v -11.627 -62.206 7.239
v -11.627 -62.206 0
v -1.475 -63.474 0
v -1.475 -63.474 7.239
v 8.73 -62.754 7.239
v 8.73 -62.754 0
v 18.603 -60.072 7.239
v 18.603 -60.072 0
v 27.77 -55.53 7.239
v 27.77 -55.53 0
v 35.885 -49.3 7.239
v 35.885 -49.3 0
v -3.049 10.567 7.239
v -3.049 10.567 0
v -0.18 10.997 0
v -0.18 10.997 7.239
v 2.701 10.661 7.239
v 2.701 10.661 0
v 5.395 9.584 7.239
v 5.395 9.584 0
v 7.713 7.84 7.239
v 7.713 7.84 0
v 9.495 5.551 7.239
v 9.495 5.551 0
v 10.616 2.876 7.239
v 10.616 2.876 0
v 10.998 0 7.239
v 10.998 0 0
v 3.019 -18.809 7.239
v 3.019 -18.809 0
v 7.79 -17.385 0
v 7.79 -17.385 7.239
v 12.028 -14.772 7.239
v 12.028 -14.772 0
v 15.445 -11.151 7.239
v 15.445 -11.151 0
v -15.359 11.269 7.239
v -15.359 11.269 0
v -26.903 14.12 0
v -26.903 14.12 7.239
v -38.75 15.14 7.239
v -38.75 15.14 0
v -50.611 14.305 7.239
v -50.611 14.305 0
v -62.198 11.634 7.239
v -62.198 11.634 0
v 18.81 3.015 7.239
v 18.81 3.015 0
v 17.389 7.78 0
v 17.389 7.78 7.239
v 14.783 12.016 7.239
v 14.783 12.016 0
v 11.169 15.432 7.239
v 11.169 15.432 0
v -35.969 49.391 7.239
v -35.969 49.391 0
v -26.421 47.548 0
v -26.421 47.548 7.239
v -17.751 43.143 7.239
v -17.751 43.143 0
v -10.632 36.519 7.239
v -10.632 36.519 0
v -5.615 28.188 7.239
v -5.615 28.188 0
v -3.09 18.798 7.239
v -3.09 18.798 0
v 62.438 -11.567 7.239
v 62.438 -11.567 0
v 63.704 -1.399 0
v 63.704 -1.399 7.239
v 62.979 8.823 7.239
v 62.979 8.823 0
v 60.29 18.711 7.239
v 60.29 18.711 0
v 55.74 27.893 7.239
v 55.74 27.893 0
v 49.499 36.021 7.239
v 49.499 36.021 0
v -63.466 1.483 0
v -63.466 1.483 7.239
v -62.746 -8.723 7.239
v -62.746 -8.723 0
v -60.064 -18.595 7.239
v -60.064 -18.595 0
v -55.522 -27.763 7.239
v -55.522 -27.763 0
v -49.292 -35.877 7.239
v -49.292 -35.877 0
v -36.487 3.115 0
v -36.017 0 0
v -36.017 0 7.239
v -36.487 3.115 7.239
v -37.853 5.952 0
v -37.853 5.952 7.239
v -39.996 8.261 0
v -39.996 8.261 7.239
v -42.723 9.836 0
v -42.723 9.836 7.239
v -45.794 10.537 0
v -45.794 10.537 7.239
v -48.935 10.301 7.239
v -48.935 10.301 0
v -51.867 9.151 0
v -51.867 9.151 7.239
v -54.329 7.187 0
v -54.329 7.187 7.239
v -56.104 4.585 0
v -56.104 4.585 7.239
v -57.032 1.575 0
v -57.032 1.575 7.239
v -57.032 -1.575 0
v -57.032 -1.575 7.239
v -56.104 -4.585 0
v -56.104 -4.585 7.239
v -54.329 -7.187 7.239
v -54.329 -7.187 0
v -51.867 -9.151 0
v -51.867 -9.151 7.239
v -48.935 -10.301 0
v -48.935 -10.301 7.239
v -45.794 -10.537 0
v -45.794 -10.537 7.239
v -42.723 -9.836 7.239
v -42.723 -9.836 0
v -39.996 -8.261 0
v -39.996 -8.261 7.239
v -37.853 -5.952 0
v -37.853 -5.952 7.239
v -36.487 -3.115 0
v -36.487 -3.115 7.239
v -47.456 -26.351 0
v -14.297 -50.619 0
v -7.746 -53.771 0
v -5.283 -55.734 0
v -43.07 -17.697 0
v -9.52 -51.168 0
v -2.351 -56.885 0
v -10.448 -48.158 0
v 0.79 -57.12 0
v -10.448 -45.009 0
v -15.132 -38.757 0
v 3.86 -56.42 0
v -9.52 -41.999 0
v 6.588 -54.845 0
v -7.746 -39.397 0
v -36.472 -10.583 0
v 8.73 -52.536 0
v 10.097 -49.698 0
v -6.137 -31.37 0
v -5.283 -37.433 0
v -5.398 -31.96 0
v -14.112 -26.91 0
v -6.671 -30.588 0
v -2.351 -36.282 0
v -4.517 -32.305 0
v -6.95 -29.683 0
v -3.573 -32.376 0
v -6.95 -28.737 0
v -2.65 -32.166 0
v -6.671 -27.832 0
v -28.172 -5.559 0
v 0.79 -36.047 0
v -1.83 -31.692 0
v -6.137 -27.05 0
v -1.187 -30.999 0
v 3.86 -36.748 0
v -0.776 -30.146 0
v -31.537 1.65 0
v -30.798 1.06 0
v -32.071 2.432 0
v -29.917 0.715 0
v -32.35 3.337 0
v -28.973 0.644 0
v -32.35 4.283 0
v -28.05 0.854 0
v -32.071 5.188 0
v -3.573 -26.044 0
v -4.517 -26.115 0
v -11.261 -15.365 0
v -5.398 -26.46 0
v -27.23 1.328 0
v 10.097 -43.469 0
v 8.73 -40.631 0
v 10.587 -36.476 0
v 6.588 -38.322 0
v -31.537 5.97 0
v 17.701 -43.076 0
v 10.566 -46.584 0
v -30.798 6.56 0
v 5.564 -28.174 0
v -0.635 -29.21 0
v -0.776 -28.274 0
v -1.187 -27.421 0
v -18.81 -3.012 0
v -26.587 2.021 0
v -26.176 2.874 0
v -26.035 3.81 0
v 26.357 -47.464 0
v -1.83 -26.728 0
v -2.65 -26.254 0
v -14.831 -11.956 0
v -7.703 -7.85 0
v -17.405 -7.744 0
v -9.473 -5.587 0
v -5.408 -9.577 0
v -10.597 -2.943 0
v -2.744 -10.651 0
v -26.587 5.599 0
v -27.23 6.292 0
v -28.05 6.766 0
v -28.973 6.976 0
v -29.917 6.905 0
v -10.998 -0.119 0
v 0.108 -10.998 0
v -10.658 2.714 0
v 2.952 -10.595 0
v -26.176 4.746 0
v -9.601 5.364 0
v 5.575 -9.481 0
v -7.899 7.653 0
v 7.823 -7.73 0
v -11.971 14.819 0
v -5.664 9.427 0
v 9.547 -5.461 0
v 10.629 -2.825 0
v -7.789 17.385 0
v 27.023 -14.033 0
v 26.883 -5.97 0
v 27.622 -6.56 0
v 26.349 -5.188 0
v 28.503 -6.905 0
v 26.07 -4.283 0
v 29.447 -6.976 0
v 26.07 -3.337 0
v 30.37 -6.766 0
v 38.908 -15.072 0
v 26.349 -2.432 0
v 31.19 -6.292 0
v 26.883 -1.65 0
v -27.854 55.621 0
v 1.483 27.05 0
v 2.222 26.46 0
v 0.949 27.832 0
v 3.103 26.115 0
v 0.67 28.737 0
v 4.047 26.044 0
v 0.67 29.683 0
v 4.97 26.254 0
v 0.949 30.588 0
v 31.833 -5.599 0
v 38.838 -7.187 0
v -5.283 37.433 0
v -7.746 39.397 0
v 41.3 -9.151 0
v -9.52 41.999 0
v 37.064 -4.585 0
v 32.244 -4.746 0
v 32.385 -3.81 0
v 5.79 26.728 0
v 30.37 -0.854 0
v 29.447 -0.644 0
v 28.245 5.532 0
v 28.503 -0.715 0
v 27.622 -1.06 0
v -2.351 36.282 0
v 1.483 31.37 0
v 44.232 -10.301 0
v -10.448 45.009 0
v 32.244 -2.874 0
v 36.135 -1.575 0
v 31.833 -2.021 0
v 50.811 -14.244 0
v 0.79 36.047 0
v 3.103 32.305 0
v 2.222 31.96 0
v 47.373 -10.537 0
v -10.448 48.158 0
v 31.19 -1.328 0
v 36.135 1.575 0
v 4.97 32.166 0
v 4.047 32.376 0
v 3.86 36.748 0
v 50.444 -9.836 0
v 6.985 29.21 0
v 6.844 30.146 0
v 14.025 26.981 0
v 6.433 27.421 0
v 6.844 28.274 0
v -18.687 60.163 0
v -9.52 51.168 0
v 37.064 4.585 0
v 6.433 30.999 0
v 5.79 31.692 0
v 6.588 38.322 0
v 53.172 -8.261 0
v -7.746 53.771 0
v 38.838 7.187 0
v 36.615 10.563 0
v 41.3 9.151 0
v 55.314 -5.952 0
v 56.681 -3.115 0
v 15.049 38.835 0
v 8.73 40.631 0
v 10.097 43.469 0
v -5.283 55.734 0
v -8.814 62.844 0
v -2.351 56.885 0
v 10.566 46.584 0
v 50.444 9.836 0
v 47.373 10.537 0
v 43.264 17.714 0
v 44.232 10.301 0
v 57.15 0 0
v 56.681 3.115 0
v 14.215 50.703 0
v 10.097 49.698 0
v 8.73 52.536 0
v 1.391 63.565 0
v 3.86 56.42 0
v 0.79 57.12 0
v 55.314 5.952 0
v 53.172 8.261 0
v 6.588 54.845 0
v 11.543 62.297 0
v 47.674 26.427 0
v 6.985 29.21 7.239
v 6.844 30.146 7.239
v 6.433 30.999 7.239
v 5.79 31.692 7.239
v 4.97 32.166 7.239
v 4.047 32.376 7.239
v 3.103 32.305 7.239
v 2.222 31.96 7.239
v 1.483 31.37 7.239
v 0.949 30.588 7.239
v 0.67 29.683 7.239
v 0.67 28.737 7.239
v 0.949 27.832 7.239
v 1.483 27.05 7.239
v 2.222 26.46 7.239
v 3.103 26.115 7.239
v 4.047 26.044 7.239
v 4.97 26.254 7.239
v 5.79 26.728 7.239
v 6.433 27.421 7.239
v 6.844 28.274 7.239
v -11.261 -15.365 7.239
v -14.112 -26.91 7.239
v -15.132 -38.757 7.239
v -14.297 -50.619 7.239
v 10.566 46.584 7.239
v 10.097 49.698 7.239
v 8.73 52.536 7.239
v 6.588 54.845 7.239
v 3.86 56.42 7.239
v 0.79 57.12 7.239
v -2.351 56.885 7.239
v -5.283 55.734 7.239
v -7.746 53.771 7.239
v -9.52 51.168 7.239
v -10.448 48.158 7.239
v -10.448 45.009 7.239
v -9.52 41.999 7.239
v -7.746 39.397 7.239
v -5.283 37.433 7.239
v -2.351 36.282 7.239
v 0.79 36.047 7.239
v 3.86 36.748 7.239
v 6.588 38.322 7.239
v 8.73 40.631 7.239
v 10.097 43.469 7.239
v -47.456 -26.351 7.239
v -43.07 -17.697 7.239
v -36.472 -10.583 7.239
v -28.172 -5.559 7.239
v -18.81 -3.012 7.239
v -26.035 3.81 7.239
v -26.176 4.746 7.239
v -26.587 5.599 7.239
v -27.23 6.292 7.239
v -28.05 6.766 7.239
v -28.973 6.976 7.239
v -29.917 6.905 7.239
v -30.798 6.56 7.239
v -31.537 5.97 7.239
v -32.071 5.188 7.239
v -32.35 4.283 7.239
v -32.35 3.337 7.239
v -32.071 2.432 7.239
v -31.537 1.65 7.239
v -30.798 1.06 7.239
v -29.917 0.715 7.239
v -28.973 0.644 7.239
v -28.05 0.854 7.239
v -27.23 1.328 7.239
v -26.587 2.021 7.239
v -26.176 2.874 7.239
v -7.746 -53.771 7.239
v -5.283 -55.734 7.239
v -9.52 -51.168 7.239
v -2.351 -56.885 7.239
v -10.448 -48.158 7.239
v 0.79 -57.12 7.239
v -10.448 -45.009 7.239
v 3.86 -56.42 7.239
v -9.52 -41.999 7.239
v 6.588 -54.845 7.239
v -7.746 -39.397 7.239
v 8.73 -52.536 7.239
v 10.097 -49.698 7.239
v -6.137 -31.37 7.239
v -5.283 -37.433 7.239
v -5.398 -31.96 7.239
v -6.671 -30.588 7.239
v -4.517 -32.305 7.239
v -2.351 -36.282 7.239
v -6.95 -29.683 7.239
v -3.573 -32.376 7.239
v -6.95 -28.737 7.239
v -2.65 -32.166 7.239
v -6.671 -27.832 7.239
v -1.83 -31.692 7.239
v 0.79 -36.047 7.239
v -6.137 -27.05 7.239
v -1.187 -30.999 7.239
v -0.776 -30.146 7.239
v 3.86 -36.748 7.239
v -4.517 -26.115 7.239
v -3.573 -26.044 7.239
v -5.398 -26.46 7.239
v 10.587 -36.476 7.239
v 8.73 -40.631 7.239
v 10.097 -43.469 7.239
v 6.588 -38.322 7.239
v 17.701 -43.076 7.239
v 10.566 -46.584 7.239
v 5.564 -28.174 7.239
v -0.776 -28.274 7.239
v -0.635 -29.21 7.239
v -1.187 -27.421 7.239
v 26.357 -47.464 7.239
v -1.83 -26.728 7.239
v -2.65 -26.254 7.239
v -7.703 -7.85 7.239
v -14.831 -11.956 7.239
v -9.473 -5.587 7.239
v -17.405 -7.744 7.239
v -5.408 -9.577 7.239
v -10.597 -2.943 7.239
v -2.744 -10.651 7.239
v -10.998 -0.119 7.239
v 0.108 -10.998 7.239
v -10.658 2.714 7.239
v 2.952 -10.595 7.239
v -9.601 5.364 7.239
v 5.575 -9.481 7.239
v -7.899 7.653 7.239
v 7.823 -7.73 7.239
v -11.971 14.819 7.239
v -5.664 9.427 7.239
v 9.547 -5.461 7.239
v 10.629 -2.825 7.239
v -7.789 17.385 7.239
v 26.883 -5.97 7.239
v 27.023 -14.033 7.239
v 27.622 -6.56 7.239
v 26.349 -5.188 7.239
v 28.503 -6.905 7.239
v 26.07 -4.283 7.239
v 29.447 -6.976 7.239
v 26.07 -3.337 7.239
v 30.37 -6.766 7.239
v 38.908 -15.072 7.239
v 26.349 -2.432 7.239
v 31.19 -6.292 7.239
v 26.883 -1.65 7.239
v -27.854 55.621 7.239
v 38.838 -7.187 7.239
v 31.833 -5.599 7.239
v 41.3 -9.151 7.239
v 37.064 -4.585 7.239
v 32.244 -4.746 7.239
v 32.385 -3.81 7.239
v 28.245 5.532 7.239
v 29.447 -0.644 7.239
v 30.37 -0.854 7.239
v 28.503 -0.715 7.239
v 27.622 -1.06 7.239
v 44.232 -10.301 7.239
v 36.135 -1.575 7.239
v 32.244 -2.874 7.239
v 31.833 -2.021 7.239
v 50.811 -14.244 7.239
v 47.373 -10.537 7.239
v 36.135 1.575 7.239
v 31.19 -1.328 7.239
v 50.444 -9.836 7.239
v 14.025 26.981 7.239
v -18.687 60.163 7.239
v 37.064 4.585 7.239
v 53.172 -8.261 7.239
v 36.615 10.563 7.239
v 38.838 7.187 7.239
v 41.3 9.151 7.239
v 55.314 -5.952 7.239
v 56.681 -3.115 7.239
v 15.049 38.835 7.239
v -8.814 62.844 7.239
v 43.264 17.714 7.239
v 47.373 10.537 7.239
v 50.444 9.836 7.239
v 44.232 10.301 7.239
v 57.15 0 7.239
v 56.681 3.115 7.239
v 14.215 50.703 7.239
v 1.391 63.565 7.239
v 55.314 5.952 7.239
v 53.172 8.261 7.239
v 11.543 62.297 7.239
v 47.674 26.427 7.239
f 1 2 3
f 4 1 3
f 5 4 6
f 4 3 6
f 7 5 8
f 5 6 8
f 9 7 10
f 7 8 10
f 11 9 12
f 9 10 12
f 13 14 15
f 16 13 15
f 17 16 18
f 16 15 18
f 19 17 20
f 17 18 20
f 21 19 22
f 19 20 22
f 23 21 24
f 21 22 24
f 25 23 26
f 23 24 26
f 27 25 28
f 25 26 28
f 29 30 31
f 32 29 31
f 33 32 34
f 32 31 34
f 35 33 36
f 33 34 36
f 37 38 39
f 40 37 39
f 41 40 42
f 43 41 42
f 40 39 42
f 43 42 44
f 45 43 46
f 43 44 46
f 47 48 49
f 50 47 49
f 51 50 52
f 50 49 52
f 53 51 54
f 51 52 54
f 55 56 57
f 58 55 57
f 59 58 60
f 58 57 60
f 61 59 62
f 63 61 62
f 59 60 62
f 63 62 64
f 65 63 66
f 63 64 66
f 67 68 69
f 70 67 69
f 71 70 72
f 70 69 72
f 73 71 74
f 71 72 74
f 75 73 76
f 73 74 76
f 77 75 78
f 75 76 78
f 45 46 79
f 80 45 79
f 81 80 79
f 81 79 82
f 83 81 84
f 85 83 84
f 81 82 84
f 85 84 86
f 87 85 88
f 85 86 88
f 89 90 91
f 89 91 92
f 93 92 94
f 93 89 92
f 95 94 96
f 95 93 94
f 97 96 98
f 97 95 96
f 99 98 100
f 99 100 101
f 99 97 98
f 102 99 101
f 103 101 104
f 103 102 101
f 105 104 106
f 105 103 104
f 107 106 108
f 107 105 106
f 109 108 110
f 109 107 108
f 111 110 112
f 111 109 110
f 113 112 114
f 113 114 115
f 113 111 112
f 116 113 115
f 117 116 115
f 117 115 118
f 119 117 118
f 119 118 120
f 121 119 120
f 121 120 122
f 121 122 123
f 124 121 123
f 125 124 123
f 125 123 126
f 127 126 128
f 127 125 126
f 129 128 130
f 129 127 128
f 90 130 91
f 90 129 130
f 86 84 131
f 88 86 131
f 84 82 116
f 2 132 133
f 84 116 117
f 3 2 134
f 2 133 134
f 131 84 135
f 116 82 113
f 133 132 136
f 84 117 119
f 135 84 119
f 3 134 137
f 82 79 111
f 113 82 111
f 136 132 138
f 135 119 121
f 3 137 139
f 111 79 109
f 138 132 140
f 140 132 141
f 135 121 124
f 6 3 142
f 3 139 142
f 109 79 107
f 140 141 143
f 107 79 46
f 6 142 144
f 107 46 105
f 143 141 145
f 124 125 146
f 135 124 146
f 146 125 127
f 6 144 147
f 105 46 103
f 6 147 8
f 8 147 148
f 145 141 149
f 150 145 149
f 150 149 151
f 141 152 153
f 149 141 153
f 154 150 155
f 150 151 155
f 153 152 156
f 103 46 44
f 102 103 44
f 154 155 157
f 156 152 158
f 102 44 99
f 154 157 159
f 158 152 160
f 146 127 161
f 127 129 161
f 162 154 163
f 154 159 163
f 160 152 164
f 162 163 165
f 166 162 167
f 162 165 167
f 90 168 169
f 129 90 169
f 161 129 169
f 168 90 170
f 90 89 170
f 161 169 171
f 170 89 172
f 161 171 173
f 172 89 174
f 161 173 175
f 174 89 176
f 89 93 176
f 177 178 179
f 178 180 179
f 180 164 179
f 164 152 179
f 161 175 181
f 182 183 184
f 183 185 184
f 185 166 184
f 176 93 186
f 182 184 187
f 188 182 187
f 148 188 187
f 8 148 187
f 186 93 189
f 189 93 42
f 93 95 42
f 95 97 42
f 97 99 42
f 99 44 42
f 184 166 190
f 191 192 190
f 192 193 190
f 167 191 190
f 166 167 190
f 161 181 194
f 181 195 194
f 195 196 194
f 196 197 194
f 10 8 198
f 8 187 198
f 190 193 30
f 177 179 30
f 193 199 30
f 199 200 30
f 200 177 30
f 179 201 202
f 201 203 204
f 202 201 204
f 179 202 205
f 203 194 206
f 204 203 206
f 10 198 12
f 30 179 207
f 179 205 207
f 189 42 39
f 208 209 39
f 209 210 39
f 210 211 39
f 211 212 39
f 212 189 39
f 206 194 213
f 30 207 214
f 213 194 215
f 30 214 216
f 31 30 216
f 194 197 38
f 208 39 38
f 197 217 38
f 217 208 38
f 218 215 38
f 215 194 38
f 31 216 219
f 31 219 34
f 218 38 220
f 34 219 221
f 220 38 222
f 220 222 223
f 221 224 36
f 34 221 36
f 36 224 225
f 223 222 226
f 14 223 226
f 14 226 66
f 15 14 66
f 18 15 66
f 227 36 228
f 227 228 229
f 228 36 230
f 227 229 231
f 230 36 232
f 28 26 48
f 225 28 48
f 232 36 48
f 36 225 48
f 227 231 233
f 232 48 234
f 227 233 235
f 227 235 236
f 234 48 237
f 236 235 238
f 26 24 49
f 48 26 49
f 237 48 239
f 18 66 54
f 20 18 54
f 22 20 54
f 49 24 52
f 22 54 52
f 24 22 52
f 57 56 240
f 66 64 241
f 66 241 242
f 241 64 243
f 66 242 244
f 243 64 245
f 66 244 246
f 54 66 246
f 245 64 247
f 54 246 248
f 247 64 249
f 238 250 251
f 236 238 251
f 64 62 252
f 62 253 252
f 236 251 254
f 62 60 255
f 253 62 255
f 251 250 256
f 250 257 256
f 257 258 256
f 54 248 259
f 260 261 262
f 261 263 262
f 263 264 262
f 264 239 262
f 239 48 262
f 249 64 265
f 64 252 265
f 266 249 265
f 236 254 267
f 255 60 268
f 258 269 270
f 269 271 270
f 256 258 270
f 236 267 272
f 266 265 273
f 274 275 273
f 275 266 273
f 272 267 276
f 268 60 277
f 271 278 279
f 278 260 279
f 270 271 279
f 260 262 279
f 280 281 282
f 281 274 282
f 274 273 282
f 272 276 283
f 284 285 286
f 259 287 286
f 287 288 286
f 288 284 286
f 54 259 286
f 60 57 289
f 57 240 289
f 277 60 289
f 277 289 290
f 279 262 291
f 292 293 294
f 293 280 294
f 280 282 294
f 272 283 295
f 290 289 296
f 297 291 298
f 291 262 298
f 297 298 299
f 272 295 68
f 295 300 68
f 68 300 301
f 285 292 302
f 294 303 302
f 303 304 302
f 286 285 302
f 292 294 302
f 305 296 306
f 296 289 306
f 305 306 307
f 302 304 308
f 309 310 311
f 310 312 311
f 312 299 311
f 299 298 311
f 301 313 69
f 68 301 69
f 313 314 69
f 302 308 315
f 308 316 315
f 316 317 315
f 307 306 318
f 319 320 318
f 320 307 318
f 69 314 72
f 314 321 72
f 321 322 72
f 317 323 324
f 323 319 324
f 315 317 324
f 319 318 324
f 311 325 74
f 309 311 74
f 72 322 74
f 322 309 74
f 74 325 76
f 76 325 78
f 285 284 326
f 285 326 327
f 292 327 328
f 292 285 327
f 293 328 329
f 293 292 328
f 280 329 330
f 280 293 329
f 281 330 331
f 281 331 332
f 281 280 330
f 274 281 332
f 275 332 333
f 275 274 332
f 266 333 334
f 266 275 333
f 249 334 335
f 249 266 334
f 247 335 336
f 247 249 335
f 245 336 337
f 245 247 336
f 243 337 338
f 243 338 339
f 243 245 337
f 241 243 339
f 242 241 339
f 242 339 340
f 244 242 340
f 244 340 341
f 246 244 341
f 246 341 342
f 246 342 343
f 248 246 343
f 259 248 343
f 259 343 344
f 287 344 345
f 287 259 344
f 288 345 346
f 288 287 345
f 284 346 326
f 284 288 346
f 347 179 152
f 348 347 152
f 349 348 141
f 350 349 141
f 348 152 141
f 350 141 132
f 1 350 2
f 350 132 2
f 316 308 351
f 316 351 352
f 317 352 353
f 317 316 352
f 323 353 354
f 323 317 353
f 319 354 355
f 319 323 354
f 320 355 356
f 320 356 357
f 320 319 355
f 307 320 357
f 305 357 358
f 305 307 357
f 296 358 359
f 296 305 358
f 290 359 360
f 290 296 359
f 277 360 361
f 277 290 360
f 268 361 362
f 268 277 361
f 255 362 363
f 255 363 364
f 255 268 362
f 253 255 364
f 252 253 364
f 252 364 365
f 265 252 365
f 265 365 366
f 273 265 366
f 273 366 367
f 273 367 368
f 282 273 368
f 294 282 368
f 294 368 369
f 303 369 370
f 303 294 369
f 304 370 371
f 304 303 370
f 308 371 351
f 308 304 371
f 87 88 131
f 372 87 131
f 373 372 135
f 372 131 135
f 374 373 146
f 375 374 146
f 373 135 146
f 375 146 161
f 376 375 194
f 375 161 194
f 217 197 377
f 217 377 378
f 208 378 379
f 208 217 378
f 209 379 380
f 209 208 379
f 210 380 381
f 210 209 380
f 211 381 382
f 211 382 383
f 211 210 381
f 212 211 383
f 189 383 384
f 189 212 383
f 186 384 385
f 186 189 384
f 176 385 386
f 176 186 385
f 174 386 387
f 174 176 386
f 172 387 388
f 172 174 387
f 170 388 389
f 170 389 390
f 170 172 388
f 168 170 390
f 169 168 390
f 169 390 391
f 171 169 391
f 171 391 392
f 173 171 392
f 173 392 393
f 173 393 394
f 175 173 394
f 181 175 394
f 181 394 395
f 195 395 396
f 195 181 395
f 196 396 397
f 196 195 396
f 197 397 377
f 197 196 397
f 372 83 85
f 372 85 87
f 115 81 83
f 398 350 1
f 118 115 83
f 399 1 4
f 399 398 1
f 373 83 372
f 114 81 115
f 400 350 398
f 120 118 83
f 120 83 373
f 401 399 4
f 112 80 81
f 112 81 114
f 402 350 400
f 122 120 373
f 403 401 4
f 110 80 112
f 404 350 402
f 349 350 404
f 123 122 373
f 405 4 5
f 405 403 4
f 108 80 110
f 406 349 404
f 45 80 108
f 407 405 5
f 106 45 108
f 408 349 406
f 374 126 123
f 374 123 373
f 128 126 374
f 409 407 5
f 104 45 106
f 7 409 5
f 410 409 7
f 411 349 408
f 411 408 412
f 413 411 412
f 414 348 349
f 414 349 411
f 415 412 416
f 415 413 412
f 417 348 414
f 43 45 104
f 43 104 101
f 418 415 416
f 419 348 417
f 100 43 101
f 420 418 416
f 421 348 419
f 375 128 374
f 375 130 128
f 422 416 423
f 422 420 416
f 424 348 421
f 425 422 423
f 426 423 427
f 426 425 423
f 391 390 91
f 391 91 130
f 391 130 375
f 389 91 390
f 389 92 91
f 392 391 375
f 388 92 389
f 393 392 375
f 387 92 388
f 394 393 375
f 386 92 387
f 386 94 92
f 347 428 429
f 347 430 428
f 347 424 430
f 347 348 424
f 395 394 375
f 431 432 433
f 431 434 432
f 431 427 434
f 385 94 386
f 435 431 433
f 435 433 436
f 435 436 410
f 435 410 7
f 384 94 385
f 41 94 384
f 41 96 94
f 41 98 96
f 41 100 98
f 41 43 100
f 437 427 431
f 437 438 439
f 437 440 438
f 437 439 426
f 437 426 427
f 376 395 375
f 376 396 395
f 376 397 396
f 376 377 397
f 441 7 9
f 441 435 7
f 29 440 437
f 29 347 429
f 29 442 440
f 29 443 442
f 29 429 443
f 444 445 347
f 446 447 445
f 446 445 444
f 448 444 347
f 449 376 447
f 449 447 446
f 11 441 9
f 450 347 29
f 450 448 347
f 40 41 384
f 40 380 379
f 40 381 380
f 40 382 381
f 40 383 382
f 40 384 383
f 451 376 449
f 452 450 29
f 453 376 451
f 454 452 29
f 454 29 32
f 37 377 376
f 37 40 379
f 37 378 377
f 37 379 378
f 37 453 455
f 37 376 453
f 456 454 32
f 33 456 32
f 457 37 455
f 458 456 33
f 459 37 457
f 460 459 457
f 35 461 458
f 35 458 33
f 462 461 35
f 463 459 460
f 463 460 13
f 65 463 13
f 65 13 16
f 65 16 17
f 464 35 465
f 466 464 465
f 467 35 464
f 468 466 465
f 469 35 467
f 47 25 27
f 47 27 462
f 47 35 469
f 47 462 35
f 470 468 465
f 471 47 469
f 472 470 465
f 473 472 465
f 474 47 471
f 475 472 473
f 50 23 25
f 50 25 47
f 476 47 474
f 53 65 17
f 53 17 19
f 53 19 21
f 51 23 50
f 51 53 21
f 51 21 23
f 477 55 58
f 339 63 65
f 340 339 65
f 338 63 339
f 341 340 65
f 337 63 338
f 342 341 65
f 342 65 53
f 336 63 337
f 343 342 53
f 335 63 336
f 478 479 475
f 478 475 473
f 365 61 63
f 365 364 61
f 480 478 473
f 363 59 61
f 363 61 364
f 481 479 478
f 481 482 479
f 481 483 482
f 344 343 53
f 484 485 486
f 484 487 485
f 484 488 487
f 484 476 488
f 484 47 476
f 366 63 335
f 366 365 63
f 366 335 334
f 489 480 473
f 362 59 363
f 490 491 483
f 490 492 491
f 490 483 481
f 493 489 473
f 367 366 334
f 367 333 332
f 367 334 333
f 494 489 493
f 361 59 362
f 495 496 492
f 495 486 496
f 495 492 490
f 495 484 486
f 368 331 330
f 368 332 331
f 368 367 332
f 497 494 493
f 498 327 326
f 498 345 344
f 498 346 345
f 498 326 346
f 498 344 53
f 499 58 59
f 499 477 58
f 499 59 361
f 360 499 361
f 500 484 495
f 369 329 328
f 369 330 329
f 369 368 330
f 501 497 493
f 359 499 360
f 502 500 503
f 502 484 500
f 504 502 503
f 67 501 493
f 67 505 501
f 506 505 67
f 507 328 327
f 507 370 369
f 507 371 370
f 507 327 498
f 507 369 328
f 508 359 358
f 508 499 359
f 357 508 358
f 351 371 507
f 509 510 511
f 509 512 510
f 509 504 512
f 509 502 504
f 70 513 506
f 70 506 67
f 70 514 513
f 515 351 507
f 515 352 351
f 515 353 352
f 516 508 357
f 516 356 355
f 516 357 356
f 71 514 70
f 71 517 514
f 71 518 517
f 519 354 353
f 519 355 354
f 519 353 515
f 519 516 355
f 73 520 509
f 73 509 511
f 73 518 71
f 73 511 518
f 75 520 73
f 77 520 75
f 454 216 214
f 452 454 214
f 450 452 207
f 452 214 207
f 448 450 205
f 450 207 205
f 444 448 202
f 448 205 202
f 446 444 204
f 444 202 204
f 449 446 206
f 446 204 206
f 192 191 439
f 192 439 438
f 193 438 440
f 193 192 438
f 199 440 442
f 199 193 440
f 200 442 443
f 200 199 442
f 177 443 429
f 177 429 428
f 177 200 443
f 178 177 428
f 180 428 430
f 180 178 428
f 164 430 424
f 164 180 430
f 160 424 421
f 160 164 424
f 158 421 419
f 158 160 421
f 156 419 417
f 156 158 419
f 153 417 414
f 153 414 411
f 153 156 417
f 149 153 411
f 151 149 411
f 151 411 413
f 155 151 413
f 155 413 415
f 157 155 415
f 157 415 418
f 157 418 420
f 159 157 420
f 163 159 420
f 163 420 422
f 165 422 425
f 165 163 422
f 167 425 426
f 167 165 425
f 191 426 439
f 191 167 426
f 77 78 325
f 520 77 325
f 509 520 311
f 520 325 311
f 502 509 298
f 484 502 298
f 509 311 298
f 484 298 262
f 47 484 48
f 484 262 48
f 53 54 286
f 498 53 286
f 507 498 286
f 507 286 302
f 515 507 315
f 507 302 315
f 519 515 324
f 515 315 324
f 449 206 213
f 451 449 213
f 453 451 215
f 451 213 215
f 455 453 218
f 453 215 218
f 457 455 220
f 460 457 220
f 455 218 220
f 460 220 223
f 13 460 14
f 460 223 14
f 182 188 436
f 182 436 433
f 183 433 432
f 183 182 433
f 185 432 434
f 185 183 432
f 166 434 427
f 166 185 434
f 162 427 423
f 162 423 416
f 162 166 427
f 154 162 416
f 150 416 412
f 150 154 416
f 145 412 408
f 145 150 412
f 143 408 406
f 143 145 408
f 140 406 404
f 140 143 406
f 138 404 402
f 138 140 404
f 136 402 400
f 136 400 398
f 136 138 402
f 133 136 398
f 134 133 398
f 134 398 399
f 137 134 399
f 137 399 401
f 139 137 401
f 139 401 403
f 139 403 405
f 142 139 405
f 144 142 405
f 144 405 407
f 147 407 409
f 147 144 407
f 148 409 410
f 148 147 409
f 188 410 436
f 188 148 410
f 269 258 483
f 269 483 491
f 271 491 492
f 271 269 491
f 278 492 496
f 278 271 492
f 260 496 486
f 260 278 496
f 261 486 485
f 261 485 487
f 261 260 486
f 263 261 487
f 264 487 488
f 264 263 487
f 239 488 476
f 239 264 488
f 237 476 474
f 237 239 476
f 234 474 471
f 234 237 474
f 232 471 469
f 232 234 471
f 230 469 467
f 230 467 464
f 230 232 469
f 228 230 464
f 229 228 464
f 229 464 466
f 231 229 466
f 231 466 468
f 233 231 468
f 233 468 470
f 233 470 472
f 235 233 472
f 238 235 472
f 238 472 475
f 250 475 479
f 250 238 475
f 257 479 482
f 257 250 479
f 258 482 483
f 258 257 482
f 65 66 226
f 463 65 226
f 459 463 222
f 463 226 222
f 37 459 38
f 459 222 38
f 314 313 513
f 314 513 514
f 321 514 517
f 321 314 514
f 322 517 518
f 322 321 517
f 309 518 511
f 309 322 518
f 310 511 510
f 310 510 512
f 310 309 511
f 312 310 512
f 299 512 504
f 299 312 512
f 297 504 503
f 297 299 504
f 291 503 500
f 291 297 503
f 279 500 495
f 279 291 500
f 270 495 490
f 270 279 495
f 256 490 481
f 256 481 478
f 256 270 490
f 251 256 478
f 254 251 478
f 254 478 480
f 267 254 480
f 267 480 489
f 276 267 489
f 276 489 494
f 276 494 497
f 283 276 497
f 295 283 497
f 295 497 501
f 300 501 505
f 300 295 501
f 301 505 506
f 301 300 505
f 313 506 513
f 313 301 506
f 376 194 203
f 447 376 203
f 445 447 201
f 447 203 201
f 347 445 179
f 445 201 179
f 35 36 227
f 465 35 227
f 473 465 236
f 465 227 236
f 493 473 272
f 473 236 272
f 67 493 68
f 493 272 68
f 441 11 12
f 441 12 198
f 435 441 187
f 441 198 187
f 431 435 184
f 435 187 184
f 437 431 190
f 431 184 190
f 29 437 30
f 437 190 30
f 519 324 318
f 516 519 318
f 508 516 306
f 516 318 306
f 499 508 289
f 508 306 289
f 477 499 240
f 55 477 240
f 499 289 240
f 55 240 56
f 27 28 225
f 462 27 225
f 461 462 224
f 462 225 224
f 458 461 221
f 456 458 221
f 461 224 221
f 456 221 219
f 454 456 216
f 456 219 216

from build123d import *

# Parameters (mm, degrees)
F0_R     = 3.175
F0_R_2   = 10.5664
F1_DEPTH = 7.239


# Not quite as in the source:
# - a feature names something its author has since deleted; it is built from what else it names


with BuildPart() as f1:
    # F0 (on Top) → F1 (new body)
    with BuildSketch(Plane.XY):
        with BuildLine():
            ThreePointArc((49.499110543, 36.0206762632), (40.1908123412, 13.9051845012), (18.8098960555, 3.0150141596))
            ThreePointArc((18.8098960555, 3.0150141596), (18.9898791446, 1.5122797598), (19.05, 0))
            ThreePointArc((19.05, 0), (18.1264129292, -5.8596633283), (15.4452068954, -11.1511472037))
            ThreePointArc((15.4452068954, -11.1511472037), (38.9084897998, -15.0723597821), (62.437543059, -11.5673340383))
            ThreePointArc((62.437543059, -11.5673340383), (61.8751789356, 13.8326514264), (49.499110543, 36.0206762632))
        make_face()
        with Locations((29.21, -3.81)):
            Circle(F0_R, mode=Mode.SUBTRACT)
        with Locations((46.5836, 0)):
            Circle(F0_R_2, mode=Mode.SUBTRACT)
        with BuildLine():
            ThreePointArc((19.05, 0), (18.9898791446, 1.5122797598), (18.8098960555, 3.0150141596))
            ThreePointArc((18.8098960555, 3.0150141596), (16.2245432897, 9.9833208424), (11.1694758624, 15.4319573923))
            ThreePointArc((11.1694758624, 15.4319573923), (4.3764318058, 18.5404785442), (-3.0896344638, 18.7977833502))
            ThreePointArc((-3.0896344638, 18.7977833502), (-9.9628775585, 16.2371047528), (-15.3591721014, 11.2693536797))
            ThreePointArc((-15.3591721014, 11.2693536797), (-18.5170306594, 4.4746033968), (-18.8103206304, -3.0123641517))
            ThreePointArc((-18.8103206304, -3.0123641517), (-16.2548336089, -9.9339259281), (-11.2609801699, -15.3653124151))
            ThreePointArc((-11.2609801699, -15.3653124151), (-4.4663849388, -18.5190147032), (3.0188073829, -18.8092876522))
            ThreePointArc((3.0188073829, -18.8092876522), (9.994585264, -16.2176066483), (15.4452068954, -11.1511472037))
            ThreePointArc((15.4452068954, -11.1511472037), (18.1264129292, -5.8596633283), (19.05, 0))
        make_face()
        with BuildLine():
            ThreePointArc((-3.0490541894, 10.5671032828), (6.6115919208, 8.7890417858), (10.9982, 0))
            ThreePointArc((10.9982, 0), (8.7587082508, -6.6517240635), (2.9522592067, -10.5945537337))
            ThreePointArc((2.9522592067, -10.5945537337), (-5.4079074823, -9.5767917333), (-10.597009287, -2.9434329297))
            ThreePointArc((-10.597009287, -2.9434329297), (-9.601427461, 5.3640464159), (-3.0490541894, 10.5671032828))
        make_face(mode=Mode.SUBTRACT)
        with BuildLine():
            ThreePointArc((-3.0896344638, 18.7977833502), (4.3764318058, 18.5404785442), (11.1694758624, 15.4319573923))
            ThreePointArc((11.1694758624, 15.4319573923), (15.0487096917, 38.8348029597), (11.5431173905, 62.2965262207))
            ThreePointArc((11.5431173905, 62.2965262207), (-13.8155129183, 61.7441471546), (-35.9687104078, 49.3909655905))
            ThreePointArc((-35.9687104078, 49.3909655905), (-13.9597183633, 40.0799728948), (-3.0896344638, 18.7977833502))
        make_face()
        with Locations((0, 46.5836)):
            Circle(F0_R_2, mode=Mode.SUBTRACT)
        with Locations((3.81, 29.21)):
            Circle(F0_R, mode=Mode.SUBTRACT)
        with BuildLine():
            ThreePointArc((35.8851180212, -49.3004770417), (13.913777395, -40.0244664241), (3.0188073829, -18.8092876522))
            ThreePointArc((3.0188073829, -18.8092876522), (-4.4663849388, -18.5190147032), (-11.2609801699, -15.3653124151))
            ThreePointArc((-11.2609801699, -15.3653124151), (-15.1324011861, -38.7568750152), (-11.6267097771, -62.2060376719))
            ThreePointArc((-11.6267097771, -62.2060376719), (13.7319205316, -61.6536586058), (35.8851180212, -49.3004770417))
        make_face()
        with Locations((0, -46.5836)):
            Circle(F0_R_2, mode=Mode.SUBTRACT)
        with Locations((-3.81, -29.21)):
            Circle(F0_R, mode=Mode.SUBTRACT)
        with BuildLine():
            ThreePointArc((-18.8103206304, -3.0123641517), (-18.5170306594, 4.4746033968), (-15.3591721014, 11.2693536797))
            ThreePointArc((-15.3591721014, 11.2693536797), (-38.7496809324, 15.1400454081), (-62.1976706421, 11.6343448498))
            ThreePointArc((-62.1976706421, 11.6343448498), (-61.6452915761, -13.7242854589), (-49.292110012, -35.8774829485))
            ThreePointArc((-49.292110012, -35.8774829485), (-40.0193213234, -13.909615697), (-18.8103206304, -3.0123641517))
        make_face()
        with Locations((-46.5836, 0)):
            Circle(F0_R_2, mode=Mode.SUBTRACT)
        with Locations((-29.21, 3.81)):
            Circle(F0_R, mode=Mode.SUBTRACT)
    extrude(amount=F1_DEPTH)


solid = f1.part
